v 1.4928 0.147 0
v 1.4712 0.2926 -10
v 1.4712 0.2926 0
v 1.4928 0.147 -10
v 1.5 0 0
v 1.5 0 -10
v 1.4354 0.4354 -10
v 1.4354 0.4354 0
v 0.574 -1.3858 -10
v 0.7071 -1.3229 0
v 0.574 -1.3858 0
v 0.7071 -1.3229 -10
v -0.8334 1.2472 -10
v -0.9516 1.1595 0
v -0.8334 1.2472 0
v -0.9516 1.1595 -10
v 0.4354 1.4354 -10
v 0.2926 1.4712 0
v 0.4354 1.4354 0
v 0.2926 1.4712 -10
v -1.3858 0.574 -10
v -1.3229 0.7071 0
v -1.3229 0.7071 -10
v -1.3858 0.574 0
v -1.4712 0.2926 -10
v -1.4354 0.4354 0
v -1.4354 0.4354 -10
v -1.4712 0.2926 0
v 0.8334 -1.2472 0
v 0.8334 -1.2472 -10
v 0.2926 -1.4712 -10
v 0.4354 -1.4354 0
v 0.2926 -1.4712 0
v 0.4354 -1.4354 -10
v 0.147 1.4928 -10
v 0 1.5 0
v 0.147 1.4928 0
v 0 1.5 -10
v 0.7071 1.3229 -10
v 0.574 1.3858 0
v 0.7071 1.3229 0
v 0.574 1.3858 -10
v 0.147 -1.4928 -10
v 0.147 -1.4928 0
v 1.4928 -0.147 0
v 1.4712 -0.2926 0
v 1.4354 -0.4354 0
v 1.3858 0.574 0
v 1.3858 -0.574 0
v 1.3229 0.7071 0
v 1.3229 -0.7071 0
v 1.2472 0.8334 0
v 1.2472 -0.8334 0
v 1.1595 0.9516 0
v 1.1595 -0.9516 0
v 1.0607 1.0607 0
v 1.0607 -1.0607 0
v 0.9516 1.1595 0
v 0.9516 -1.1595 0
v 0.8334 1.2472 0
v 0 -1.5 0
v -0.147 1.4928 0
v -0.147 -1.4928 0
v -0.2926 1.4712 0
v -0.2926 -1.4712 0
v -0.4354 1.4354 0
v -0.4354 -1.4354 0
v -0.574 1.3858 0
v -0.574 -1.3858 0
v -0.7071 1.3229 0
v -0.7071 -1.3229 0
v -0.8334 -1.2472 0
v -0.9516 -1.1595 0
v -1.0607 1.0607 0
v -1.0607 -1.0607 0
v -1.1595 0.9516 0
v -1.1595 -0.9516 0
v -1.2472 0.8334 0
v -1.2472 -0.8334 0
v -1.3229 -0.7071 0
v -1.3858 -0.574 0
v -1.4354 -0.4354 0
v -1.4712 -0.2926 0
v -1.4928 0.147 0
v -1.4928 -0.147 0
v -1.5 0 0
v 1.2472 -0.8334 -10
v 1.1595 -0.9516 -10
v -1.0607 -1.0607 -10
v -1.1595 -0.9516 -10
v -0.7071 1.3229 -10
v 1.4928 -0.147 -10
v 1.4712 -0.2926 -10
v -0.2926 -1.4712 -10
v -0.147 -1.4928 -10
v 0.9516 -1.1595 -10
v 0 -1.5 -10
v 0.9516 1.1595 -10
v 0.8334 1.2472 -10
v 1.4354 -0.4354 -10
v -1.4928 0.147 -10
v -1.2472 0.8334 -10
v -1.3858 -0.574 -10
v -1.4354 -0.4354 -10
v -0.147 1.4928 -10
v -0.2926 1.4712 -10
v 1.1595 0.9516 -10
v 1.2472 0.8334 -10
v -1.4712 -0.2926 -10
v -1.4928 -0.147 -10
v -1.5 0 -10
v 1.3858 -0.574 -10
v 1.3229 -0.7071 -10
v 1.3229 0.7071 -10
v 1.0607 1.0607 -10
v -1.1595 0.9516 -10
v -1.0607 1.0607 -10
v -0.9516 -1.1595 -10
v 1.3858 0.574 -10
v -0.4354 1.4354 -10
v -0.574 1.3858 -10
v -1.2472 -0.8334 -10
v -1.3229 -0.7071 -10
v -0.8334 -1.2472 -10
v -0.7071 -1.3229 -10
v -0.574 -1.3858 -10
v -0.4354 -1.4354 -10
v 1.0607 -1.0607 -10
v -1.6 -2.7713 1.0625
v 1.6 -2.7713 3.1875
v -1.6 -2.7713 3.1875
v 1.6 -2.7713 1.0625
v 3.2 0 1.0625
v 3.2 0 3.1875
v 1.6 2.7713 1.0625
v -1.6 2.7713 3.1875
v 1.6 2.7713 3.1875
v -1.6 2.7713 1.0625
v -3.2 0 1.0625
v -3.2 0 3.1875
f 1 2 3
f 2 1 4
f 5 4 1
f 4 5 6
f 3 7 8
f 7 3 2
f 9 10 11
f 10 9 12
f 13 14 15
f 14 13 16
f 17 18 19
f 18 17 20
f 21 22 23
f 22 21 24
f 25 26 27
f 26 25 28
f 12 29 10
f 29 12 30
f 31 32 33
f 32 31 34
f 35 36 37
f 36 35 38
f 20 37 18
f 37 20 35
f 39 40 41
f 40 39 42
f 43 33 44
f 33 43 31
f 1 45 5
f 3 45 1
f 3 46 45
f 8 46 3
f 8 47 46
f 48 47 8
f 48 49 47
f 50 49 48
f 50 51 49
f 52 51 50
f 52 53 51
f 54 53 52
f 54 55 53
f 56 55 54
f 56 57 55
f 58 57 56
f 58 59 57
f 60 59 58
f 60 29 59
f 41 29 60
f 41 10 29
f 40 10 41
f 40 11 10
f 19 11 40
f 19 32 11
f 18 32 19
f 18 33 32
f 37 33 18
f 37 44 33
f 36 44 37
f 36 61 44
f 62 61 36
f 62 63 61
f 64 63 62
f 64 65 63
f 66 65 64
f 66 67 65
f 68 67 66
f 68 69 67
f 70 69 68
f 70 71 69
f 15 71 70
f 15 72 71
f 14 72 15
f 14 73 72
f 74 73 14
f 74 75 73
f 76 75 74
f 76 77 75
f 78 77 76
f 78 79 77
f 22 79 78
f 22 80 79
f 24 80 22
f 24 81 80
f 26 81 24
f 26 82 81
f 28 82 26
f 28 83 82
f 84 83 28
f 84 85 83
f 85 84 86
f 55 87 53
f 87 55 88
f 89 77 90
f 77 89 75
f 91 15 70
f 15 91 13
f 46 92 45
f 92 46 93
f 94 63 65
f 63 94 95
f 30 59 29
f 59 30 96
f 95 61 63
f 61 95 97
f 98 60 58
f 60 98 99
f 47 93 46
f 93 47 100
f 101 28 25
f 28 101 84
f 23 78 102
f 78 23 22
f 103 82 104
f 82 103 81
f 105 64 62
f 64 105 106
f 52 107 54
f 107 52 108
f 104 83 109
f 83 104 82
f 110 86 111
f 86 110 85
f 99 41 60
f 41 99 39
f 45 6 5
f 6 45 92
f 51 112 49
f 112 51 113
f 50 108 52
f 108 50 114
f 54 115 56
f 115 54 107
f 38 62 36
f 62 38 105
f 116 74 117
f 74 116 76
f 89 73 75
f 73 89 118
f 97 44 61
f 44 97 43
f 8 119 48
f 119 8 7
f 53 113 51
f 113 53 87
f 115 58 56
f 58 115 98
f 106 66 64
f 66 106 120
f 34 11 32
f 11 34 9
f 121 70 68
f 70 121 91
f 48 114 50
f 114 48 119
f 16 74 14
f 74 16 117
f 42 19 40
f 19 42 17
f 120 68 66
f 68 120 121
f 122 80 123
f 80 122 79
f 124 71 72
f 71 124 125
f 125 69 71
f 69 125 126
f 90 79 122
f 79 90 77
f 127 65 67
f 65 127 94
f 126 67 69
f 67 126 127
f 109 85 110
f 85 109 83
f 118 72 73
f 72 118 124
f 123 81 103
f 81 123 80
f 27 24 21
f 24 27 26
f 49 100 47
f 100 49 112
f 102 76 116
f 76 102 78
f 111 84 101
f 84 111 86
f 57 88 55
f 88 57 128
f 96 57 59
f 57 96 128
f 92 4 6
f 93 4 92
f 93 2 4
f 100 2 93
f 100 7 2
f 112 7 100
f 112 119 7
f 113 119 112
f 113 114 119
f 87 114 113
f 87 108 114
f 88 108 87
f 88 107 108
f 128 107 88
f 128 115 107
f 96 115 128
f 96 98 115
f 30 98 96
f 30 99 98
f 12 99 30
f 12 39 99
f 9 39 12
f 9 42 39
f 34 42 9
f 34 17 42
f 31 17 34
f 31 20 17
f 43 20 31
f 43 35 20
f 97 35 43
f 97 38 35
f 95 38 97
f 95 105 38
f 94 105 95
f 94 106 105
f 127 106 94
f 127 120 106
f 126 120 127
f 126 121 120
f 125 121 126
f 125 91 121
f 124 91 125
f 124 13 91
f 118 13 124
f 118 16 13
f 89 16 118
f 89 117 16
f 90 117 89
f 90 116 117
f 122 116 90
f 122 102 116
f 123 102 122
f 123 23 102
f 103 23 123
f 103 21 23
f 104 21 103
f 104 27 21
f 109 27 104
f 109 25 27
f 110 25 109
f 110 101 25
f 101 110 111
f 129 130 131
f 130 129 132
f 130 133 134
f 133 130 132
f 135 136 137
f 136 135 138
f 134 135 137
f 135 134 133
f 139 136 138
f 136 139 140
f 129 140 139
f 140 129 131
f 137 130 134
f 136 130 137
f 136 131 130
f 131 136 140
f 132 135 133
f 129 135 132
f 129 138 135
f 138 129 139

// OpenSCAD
module hex_head_screw() {
    union() {
        // Screw shaft
        translate([0, 0, -10])
            cylinder(h=10, d=3.0, $fn=64);
        
        // Hex head
        translate([0, 0, 2.125/2])
            cylinder(h=2.125, d1=6.4, d2=6.4, $fn=6);
    }
}

hex_head_screw();
